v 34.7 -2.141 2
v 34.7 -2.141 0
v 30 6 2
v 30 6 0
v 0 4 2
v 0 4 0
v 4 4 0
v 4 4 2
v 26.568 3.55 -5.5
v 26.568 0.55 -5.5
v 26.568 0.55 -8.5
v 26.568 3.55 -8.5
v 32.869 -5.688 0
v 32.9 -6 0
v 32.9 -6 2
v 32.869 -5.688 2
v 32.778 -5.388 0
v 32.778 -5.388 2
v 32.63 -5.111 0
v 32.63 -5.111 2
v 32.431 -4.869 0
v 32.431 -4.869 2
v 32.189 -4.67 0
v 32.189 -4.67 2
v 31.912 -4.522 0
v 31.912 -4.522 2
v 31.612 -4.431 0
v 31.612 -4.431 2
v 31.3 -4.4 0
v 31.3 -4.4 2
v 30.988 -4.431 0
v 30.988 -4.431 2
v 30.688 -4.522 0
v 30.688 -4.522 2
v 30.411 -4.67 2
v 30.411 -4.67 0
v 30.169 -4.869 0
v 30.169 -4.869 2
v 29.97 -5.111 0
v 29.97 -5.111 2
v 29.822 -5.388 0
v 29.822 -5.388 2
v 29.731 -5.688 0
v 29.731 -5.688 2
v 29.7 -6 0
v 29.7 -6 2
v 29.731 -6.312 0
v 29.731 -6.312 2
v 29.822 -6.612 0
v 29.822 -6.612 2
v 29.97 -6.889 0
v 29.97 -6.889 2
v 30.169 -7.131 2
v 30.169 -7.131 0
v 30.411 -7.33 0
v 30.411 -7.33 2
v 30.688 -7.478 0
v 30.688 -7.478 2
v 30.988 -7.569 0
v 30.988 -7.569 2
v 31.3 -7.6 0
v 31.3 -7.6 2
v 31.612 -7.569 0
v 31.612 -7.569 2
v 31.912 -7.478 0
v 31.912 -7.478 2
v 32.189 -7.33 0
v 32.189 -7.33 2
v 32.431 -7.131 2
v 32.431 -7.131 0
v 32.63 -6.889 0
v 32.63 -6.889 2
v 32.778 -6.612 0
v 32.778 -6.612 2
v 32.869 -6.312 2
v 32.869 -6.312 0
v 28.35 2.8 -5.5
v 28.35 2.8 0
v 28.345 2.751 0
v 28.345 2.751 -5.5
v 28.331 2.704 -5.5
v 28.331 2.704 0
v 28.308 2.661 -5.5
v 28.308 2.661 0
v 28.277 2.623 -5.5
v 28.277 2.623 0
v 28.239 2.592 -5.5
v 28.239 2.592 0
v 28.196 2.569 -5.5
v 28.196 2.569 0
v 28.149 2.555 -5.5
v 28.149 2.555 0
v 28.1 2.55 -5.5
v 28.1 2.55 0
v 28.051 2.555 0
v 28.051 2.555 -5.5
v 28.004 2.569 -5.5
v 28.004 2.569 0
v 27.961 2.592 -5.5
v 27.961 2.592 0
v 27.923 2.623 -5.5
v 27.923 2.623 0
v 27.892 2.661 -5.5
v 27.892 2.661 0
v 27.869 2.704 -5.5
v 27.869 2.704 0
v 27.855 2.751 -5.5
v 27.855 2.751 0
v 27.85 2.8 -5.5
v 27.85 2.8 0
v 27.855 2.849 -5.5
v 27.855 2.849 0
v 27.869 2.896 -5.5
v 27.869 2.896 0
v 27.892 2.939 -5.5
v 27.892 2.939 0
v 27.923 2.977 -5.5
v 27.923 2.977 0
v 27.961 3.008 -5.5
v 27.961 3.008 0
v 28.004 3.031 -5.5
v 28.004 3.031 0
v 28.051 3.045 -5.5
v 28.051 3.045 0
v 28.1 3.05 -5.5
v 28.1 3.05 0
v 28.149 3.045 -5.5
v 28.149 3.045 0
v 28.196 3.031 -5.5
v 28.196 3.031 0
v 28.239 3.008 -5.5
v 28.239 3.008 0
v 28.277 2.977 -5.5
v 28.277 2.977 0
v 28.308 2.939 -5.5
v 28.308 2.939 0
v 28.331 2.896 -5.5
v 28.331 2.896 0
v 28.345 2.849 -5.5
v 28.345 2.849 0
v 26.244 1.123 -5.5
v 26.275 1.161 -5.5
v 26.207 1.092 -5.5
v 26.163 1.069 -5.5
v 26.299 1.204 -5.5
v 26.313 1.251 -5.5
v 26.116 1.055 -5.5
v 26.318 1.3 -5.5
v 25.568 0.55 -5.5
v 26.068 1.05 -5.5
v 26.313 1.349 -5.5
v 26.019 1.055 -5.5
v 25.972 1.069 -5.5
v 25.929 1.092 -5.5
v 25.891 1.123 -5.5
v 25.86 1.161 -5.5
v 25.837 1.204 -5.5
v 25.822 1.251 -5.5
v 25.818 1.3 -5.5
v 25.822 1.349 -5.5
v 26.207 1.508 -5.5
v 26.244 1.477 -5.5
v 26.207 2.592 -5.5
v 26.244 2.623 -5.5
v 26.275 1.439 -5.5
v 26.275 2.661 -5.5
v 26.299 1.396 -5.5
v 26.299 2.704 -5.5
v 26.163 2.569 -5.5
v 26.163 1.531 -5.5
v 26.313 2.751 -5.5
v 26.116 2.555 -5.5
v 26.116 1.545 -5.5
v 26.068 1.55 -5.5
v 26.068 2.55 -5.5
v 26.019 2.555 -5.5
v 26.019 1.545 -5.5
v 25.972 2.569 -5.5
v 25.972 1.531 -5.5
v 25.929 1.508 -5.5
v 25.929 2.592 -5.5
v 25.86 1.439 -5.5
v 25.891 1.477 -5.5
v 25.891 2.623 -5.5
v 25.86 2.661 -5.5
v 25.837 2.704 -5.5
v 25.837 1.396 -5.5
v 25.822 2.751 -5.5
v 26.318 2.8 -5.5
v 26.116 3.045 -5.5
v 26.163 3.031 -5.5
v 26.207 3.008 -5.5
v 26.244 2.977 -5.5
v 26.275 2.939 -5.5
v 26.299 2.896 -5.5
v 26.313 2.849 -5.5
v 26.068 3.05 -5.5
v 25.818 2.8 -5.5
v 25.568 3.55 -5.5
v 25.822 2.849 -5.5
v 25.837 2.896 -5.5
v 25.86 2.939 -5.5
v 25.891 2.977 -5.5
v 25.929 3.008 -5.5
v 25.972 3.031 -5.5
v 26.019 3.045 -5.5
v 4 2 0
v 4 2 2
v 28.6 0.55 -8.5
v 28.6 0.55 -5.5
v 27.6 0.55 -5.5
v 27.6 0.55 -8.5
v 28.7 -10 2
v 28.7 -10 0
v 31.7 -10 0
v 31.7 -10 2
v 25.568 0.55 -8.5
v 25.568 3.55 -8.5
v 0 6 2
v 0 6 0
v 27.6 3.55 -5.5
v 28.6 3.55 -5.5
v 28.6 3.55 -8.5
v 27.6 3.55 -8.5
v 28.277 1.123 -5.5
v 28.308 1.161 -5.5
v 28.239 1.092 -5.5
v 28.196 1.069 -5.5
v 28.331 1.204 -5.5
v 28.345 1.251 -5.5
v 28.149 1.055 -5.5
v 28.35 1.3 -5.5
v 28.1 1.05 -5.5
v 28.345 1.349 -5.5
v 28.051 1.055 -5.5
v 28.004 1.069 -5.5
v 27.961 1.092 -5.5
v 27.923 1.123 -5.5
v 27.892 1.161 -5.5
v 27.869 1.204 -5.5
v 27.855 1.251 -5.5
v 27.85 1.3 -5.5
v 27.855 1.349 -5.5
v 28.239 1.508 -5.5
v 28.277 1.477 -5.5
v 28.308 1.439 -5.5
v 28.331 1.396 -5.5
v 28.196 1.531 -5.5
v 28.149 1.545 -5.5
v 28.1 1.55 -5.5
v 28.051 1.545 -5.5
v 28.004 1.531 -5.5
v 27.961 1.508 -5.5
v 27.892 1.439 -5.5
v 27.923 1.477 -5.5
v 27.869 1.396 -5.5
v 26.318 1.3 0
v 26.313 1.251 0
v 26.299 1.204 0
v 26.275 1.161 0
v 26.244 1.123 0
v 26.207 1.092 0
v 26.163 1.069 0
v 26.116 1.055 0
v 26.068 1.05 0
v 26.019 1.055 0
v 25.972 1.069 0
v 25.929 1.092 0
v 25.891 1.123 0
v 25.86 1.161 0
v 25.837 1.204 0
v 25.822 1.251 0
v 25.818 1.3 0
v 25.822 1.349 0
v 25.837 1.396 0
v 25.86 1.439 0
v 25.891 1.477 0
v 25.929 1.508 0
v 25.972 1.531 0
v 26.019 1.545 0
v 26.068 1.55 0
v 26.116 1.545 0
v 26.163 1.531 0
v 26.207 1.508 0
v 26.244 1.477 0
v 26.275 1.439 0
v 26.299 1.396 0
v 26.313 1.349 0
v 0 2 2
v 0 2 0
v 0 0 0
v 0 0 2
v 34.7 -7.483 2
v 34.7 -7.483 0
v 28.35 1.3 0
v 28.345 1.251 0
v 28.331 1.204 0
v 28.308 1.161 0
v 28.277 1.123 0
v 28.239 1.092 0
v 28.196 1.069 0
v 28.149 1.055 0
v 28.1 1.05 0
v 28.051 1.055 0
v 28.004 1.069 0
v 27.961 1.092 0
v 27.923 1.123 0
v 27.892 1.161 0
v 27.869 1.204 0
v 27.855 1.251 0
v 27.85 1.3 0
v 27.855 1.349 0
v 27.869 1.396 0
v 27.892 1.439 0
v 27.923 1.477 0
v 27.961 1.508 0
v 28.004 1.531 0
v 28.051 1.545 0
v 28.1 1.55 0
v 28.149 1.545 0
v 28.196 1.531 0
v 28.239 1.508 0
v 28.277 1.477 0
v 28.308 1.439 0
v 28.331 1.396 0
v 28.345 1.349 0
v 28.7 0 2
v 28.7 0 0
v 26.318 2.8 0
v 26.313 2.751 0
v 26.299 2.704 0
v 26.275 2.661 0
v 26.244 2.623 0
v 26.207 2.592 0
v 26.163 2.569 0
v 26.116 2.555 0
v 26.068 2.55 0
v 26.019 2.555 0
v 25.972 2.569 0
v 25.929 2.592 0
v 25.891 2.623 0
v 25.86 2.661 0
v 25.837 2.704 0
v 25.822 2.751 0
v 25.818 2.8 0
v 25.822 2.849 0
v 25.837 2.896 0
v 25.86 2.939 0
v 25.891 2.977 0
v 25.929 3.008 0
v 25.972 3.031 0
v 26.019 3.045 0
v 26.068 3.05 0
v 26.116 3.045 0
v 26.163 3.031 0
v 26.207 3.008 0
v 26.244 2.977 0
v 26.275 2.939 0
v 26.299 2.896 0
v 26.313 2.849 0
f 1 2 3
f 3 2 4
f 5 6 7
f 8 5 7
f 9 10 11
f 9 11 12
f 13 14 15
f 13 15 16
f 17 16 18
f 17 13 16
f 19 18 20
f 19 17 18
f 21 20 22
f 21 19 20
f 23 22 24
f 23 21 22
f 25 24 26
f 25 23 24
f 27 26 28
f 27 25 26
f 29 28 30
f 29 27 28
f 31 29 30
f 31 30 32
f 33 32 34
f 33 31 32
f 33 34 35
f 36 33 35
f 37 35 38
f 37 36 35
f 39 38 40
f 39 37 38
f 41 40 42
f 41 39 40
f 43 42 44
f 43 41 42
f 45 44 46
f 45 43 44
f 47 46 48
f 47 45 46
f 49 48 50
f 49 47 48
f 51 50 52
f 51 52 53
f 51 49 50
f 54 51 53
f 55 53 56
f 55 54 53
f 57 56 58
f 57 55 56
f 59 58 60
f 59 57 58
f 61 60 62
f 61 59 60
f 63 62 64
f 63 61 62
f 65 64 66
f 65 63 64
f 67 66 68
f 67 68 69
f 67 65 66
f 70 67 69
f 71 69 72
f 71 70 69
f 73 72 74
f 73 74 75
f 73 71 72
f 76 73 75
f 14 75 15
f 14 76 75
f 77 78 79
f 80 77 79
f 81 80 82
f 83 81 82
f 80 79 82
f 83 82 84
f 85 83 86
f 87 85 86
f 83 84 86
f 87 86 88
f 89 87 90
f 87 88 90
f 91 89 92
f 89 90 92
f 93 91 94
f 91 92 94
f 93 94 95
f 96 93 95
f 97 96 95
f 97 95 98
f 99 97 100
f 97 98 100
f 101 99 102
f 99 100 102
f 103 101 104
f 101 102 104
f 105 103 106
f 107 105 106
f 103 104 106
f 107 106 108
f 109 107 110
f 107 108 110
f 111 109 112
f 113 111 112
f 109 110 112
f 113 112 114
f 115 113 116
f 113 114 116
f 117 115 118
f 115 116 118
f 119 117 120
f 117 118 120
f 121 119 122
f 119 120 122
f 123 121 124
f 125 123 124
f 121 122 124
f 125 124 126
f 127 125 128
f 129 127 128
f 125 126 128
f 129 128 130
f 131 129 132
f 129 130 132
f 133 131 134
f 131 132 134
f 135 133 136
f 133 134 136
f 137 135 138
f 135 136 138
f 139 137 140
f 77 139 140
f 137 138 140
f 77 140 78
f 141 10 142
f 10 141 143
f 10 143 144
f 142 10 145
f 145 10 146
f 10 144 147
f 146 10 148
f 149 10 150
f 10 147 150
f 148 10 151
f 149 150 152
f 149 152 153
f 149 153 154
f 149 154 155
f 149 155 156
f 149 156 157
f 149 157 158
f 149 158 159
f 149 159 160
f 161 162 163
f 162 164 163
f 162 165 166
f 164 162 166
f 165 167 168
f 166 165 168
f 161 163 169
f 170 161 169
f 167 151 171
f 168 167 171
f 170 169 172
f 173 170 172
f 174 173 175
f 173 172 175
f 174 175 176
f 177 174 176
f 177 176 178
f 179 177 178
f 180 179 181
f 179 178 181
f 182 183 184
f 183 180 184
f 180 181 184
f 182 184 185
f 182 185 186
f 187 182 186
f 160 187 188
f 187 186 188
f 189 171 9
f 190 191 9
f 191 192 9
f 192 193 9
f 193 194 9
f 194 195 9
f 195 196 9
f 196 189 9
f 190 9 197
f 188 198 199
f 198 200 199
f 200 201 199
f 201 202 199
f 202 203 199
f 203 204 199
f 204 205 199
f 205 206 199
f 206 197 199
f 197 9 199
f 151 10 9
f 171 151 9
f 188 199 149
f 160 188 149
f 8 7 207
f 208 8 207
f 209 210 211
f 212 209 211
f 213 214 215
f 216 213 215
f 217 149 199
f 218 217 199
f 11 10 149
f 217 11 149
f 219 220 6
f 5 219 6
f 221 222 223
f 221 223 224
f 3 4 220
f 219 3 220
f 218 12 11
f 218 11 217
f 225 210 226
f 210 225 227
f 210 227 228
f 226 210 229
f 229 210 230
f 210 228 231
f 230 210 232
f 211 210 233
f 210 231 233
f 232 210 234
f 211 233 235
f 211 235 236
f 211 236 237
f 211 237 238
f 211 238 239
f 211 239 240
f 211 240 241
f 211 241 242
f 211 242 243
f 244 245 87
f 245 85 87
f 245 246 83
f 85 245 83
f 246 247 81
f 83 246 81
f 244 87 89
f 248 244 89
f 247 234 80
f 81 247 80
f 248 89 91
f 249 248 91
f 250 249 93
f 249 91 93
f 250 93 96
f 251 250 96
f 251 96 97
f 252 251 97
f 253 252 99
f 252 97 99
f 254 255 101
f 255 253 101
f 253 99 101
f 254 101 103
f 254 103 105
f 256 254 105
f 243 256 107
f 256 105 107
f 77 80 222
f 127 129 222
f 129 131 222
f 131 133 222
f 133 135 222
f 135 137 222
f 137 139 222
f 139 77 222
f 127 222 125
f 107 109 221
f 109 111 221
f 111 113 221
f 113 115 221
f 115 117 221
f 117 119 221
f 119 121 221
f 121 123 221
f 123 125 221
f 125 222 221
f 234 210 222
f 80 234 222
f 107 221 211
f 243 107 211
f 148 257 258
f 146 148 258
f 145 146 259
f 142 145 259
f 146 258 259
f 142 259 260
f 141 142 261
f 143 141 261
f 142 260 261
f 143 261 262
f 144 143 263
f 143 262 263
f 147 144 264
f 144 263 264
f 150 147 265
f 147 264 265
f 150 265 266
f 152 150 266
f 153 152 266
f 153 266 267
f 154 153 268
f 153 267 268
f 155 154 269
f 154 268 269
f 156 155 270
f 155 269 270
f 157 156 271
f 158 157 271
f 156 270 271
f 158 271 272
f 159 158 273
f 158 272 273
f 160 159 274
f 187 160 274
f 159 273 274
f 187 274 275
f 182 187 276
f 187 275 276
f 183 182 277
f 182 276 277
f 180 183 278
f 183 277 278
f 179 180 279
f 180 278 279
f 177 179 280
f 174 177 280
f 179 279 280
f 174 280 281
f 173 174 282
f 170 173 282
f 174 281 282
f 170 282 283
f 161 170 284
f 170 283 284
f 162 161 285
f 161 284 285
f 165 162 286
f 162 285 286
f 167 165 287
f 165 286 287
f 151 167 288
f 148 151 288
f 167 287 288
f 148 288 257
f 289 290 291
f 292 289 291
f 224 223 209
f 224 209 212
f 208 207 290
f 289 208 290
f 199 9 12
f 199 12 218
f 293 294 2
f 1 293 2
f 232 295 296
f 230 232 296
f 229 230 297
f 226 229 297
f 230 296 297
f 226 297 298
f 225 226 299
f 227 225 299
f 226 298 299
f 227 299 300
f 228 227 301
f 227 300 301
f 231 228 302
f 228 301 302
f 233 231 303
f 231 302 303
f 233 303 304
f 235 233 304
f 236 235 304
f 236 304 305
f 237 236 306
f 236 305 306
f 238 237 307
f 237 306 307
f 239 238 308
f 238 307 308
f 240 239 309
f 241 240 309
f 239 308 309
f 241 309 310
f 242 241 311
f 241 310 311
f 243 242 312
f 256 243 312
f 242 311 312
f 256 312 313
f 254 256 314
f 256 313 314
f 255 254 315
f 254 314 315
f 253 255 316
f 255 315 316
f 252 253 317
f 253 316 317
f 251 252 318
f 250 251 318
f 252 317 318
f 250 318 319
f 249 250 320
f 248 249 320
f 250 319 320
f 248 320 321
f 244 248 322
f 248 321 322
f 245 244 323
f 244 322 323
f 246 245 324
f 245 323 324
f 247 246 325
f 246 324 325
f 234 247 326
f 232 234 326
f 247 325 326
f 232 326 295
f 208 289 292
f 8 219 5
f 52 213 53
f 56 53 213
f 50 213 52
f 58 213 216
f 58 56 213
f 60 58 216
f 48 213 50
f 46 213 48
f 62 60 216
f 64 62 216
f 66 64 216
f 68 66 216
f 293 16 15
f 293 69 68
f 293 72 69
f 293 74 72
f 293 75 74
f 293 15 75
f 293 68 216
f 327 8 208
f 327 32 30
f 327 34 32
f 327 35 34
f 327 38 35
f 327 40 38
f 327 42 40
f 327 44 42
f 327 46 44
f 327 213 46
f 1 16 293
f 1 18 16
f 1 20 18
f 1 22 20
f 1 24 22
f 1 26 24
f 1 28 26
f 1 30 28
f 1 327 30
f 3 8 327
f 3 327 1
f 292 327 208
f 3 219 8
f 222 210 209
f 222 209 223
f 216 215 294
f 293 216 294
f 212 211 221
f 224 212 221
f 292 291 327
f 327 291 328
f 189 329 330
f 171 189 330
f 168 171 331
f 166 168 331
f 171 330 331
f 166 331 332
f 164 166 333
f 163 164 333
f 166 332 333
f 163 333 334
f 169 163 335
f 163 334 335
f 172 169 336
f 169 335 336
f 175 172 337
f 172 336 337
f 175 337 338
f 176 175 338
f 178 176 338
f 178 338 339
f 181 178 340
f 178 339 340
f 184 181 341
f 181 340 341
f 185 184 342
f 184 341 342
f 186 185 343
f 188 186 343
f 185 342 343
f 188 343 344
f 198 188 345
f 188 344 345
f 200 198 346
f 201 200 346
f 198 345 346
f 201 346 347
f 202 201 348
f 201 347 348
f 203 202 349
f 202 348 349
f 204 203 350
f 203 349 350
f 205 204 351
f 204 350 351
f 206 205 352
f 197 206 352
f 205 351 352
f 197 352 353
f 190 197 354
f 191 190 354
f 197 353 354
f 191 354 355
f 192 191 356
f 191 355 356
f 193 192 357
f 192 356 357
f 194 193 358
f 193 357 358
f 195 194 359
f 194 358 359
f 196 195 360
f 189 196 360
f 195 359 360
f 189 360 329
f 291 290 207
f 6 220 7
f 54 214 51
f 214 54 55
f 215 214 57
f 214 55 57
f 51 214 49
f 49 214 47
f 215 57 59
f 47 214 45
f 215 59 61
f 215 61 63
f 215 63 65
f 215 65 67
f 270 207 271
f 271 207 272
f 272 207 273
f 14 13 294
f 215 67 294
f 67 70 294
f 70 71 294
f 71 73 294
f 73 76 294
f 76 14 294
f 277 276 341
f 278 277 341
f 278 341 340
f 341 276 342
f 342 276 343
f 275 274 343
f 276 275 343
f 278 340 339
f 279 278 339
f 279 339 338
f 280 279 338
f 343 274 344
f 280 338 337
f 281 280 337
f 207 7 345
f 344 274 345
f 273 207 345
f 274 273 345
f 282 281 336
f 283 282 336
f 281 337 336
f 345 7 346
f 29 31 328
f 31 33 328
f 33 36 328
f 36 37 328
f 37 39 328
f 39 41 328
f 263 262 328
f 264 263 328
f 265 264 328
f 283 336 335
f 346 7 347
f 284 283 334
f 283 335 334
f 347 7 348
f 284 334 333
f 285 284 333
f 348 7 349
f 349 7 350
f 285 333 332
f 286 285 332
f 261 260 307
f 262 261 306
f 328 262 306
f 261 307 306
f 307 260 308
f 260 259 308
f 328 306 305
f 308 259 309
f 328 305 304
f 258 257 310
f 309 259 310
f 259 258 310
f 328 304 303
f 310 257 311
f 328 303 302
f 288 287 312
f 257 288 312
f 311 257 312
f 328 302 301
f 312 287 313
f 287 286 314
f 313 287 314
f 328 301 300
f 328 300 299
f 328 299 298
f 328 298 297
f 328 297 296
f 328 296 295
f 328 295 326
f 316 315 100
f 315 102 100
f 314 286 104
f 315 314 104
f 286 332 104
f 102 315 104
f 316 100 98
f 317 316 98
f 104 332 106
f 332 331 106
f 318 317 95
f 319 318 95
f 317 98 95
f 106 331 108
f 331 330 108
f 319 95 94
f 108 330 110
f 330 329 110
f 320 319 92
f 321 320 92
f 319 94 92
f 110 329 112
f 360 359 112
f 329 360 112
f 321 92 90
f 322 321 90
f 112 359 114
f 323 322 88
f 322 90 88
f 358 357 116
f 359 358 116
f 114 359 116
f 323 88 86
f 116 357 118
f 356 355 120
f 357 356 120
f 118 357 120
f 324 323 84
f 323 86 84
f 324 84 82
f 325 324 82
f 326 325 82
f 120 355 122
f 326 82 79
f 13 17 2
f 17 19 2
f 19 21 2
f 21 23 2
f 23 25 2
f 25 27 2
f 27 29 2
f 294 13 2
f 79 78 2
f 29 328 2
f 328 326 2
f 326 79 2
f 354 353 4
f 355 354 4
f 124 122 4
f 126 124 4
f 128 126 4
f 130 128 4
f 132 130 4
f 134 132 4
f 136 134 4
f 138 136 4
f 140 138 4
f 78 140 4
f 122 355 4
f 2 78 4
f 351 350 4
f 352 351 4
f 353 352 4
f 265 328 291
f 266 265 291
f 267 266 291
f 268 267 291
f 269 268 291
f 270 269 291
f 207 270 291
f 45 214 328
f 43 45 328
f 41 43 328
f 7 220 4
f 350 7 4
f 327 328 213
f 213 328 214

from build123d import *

# Parameters (mm, degrees)
ESQUISSE1_R        = 1.6
BOSS_EXTRU_1_DEPTH = 2
ESQUISSE2_R        = 0.25
BOSS_EXTRU_2_DEPTH = 5.5
ESQUISSE3_W        = 1
ESQUISSE3_H        = 3
BOSS_EXTRU_3_DEPTH = 3


with BuildPart() as part:
    # Esquisse1 → Boss.-Extru.1 (new body)
    with BuildSketch(Plane.XY):
        Polygon((0, 0), (28.7, 0), (28.7, -10), (31.7, -10), (34.7, -7.482701106), (34.7, -2.140638796), (30, 6), (0, 6), (0, 4), (4, 4), (4, 2), (0, 2), align=None)
        with Locations((31.3, -6)):
            Circle(ESQUISSE1_R, mode=Mode.SUBTRACT)
    extrude(amount=BOSS_EXTRU_1_DEPTH)

    # Esquisse2 → Boss.-Extru.2 (add)
    with BuildSketch(Plane(origin=(0, 0, 0), x_dir=(-1, 0, 0), z_dir=(0, 0, -1))):
        with Locations(Location((-28.1, 1.3, 0), (0, 0, 180))):
            Circle(ESQUISSE2_R)
        with Locations(Location((-28.1, 2.8, 0), (0, 0, 180))):
            Circle(ESQUISSE2_R)
        with Locations(Location((-26.067622213, 1.3, 0), (0, 0, 180))):
            Circle(ESQUISSE2_R)
        with Locations(Location((-26.067622213, 2.8, 0), (0, 0, 180))):
            Circle(ESQUISSE2_R)
    extrude(amount=BOSS_EXTRU_2_DEPTH)

    # Esquisse3 → Boss.-Extru.3 (add)
    with BuildSketch(Plane(origin=(0, 0, -5.5), x_dir=(-1, 0, 0), z_dir=(0, 0, -1))):
        with Locations((-28.1, 2.05)):
            Rectangle(ESQUISSE3_W, ESQUISSE3_H)
        with Locations((-26.067622213, 2.05)):
            Rectangle(ESQUISSE3_W, ESQUISSE3_H)
    extrude(amount=BOSS_EXTRU_3_DEPTH)


solid = part.part
